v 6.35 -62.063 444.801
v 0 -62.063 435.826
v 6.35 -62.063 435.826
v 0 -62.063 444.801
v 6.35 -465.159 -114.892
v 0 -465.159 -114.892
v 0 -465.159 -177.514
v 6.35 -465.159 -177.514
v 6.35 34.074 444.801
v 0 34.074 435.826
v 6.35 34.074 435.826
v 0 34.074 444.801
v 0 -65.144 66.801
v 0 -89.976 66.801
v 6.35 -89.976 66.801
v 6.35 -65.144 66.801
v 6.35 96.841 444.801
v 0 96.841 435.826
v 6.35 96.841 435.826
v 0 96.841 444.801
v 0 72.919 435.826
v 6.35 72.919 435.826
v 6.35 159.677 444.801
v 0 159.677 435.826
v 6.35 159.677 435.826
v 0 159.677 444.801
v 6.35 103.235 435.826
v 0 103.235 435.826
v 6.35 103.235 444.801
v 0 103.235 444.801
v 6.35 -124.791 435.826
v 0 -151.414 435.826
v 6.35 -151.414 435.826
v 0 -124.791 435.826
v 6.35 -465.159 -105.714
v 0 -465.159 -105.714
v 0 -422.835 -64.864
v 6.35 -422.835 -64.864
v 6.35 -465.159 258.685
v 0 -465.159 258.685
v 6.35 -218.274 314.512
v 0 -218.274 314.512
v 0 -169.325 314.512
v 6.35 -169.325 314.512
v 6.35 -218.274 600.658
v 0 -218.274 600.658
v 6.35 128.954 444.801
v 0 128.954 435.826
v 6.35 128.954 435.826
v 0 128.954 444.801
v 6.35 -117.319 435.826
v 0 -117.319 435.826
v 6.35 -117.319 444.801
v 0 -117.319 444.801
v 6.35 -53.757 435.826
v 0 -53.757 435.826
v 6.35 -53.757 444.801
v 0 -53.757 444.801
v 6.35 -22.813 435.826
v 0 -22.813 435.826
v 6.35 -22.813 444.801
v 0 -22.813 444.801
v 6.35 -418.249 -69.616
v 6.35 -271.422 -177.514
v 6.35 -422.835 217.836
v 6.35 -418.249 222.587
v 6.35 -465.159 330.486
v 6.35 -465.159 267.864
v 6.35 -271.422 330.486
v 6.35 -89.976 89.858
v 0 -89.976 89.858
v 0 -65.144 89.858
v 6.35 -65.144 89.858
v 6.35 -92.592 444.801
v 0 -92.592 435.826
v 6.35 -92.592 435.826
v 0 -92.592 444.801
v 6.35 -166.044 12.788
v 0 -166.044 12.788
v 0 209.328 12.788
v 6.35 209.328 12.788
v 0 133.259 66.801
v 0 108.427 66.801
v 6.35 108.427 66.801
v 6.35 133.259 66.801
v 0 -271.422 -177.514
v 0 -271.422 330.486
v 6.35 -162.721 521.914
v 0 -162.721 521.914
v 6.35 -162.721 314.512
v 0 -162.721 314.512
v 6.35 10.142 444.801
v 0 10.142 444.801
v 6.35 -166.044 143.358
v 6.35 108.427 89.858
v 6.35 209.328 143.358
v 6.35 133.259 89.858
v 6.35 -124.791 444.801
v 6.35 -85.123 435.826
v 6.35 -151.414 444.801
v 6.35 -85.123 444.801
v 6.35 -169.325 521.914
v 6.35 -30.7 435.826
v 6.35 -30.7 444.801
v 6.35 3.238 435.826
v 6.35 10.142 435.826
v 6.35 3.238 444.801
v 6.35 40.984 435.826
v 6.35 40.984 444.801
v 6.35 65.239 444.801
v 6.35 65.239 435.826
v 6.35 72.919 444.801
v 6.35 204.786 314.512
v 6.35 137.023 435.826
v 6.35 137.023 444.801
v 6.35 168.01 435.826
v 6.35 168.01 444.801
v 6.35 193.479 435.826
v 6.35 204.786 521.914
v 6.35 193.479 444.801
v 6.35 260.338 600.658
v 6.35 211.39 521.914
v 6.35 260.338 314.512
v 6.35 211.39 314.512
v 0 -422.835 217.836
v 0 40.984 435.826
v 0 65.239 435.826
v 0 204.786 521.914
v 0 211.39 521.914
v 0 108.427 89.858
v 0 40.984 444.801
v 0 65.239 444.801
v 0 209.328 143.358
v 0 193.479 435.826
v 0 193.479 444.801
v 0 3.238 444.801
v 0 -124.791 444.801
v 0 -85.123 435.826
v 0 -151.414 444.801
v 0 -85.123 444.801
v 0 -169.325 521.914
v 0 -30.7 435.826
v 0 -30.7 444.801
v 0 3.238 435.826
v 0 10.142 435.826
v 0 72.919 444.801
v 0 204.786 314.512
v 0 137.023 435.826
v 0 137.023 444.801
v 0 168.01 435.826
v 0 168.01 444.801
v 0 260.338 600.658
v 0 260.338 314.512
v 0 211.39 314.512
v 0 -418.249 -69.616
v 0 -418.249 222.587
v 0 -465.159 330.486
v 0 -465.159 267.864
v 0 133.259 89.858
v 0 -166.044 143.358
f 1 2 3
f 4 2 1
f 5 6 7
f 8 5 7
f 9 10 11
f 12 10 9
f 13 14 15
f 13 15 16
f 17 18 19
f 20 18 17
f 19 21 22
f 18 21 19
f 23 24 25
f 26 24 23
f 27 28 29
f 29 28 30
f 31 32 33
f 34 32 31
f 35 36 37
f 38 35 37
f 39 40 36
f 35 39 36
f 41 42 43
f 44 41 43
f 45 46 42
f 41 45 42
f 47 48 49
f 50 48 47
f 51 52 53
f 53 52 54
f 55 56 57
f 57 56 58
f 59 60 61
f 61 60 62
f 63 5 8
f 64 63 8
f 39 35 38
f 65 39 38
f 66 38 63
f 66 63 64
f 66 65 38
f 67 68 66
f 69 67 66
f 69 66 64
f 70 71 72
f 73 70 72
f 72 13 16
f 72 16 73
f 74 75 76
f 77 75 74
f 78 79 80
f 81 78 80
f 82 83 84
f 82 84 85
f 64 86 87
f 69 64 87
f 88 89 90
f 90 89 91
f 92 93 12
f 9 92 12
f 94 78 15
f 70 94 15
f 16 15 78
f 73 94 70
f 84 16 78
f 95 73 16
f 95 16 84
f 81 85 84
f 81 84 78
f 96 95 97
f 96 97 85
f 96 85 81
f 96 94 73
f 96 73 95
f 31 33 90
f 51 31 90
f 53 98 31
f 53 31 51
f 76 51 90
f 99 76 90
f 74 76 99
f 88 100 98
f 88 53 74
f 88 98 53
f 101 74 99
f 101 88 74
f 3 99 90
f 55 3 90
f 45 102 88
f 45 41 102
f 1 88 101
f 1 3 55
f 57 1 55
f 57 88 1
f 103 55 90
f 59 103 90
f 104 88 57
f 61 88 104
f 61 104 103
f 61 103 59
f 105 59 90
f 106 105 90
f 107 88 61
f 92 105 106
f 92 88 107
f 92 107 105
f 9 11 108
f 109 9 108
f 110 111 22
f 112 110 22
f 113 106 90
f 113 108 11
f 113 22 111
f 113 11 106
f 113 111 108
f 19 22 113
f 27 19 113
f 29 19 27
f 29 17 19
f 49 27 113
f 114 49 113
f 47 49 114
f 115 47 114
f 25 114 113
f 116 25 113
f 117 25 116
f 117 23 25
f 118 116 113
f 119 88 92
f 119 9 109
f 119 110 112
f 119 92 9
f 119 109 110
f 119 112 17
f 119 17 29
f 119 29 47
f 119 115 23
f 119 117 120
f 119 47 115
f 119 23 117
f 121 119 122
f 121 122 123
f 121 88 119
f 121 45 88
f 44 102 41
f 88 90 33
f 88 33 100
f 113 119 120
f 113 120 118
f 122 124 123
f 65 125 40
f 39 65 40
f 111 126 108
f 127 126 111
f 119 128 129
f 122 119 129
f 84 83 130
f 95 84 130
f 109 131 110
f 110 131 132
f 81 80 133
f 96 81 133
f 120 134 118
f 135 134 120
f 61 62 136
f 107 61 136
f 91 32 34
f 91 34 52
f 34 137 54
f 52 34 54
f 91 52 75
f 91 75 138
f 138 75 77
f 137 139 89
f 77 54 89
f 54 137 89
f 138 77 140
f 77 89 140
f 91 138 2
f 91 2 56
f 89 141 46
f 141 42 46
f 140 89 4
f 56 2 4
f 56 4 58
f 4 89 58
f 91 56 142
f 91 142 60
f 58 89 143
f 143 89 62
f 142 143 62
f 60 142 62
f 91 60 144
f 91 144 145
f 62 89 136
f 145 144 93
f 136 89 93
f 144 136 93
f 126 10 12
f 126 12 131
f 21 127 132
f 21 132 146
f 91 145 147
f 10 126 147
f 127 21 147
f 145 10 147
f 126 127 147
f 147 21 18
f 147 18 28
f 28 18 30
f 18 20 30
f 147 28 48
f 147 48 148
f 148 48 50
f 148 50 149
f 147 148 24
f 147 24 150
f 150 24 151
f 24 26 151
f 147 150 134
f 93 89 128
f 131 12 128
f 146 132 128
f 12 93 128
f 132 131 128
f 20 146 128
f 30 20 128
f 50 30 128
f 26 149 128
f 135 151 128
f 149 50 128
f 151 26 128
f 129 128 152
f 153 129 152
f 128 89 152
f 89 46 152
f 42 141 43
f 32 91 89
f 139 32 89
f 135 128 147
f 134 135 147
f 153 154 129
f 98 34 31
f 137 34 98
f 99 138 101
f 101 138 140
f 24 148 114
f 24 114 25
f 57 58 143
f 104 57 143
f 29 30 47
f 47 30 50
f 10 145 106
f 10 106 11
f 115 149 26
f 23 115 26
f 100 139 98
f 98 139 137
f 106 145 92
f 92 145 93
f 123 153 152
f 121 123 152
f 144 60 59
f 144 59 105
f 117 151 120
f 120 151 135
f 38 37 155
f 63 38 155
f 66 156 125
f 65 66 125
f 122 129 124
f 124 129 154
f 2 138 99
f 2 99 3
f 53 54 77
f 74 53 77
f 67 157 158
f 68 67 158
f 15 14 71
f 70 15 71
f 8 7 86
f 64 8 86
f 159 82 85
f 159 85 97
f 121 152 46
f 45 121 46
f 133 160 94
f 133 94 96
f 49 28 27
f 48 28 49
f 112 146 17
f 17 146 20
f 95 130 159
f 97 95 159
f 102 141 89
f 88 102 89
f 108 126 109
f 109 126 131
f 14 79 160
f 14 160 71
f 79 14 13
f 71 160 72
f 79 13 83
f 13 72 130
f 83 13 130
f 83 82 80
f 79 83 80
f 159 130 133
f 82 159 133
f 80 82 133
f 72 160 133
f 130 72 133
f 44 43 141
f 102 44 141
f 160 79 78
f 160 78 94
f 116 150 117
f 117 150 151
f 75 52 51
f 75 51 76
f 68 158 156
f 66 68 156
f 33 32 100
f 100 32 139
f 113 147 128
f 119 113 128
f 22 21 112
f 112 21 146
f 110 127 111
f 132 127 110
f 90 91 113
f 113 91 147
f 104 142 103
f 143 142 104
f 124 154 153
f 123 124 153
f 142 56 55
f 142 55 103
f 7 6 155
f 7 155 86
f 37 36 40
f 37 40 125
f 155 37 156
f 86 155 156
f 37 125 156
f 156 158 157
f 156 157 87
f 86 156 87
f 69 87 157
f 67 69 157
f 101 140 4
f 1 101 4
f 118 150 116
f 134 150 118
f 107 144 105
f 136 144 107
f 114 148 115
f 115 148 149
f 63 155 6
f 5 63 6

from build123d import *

# Parameters (mm, degrees)
F0_W     = 375.371941
F0_H     = 130.569776
F0_W_2   = 24.831633
F0_H_2   = 23.056487
F0_W_3   = 26.62291
F0_H_3   = 8.975066
F0_W_4   = 24.726913
F0_W_5   = 23.059815
F0_W_6   = 23.057102
F0_W_7   = 26.05096
F0_W_8   = 23.932469
F0_W_9   = 24.255397
F0_W_10  = 23.922292
F0_W_11  = 25.718499
F0_W_12  = 22.654171
F0_W_13  = 25.46921
F1_DEPTH = 6.35


with BuildPart() as f1:
    # F0 (on Right) → F1 (new body)
    with BuildSketch(Plane.YZ):
        Polygon((-271.421876, 330.485767), (-465.15853, 330.485767), (-465.15853, 267.863764), (-418.248745, 222.587234), (-422.835025, 217.835514), (-465.15853, 258.685443), (-465.15853, -105.713909), (-422.835025, -64.863979), (-418.248745, -69.6157), (-465.15853, -114.89223), (-465.15853, -177.514233), (-271.421876, -177.514233), align=None)
        with Locations((21.641564, 78.073309)):
            Rectangle(F0_W, F0_H)
        with Locations((-77.560084, 78.329652)):
            Rectangle(F0_W_2, F0_H_2, mode=Mode.SUBTRACT)
        with Locations((120.843211, 78.329652)):
            Rectangle(F0_W_2, F0_H_2, mode=Mode.SUBTRACT)
        Polygon((260.338359, 600.658462), (-218.273673, 600.658462), (-218.273673, 314.511762), (-169.325112, 314.511762), (-169.325112, 521.91418), (-162.721112, 521.91418), (-162.721112, 314.511762), (204.785798, 314.511762), (204.785798, 521.91418), (211.389798, 521.91418), (211.389798, 314.511762), (260.338359, 314.511762), align=None)
        with Locations((-138.102722, 440.31387)):
            Rectangle(F0_W_3, F0_H_3, mode=Mode.SUBTRACT)
        with Locations((-104.955673, 440.31387)):
            Rectangle(F0_W_4, F0_H_3, mode=Mode.SUBTRACT)
        with Locations((-73.592881, 440.31387)):
            Rectangle(F0_W_5, F0_H_3, mode=Mode.SUBTRACT)
        with Locations((-42.228721, 440.31387)):
            Rectangle(F0_W_6, F0_H_3, mode=Mode.SUBTRACT)
        with Locations((-9.787129, 440.31387)):
            Rectangle(F0_W_7, F0_H_3, mode=Mode.SUBTRACT)
        with Locations((22.107952, 440.31387)):
            Rectangle(F0_W_8, F0_H_3, mode=Mode.SUBTRACT)
        with Locations((53.111733, 440.31387)):
            Rectangle(F0_W_9, F0_H_3, mode=Mode.SUBTRACT)
        with Locations((84.880201, 440.31387)):
            Rectangle(F0_W_10, F0_H_3, mode=Mode.SUBTRACT)
        with Locations((116.094691, 440.31387)):
            Rectangle(F0_W_11, F0_H_3, mode=Mode.SUBTRACT)
        with Locations((148.349722, 440.31387)):
            Rectangle(F0_W_12, F0_H_3, mode=Mode.SUBTRACT)
        with Locations((180.744258, 440.31387)):
            Rectangle(F0_W_13, F0_H_3, mode=Mode.SUBTRACT)
    extrude(amount=F1_DEPTH)


solid = f1.part
